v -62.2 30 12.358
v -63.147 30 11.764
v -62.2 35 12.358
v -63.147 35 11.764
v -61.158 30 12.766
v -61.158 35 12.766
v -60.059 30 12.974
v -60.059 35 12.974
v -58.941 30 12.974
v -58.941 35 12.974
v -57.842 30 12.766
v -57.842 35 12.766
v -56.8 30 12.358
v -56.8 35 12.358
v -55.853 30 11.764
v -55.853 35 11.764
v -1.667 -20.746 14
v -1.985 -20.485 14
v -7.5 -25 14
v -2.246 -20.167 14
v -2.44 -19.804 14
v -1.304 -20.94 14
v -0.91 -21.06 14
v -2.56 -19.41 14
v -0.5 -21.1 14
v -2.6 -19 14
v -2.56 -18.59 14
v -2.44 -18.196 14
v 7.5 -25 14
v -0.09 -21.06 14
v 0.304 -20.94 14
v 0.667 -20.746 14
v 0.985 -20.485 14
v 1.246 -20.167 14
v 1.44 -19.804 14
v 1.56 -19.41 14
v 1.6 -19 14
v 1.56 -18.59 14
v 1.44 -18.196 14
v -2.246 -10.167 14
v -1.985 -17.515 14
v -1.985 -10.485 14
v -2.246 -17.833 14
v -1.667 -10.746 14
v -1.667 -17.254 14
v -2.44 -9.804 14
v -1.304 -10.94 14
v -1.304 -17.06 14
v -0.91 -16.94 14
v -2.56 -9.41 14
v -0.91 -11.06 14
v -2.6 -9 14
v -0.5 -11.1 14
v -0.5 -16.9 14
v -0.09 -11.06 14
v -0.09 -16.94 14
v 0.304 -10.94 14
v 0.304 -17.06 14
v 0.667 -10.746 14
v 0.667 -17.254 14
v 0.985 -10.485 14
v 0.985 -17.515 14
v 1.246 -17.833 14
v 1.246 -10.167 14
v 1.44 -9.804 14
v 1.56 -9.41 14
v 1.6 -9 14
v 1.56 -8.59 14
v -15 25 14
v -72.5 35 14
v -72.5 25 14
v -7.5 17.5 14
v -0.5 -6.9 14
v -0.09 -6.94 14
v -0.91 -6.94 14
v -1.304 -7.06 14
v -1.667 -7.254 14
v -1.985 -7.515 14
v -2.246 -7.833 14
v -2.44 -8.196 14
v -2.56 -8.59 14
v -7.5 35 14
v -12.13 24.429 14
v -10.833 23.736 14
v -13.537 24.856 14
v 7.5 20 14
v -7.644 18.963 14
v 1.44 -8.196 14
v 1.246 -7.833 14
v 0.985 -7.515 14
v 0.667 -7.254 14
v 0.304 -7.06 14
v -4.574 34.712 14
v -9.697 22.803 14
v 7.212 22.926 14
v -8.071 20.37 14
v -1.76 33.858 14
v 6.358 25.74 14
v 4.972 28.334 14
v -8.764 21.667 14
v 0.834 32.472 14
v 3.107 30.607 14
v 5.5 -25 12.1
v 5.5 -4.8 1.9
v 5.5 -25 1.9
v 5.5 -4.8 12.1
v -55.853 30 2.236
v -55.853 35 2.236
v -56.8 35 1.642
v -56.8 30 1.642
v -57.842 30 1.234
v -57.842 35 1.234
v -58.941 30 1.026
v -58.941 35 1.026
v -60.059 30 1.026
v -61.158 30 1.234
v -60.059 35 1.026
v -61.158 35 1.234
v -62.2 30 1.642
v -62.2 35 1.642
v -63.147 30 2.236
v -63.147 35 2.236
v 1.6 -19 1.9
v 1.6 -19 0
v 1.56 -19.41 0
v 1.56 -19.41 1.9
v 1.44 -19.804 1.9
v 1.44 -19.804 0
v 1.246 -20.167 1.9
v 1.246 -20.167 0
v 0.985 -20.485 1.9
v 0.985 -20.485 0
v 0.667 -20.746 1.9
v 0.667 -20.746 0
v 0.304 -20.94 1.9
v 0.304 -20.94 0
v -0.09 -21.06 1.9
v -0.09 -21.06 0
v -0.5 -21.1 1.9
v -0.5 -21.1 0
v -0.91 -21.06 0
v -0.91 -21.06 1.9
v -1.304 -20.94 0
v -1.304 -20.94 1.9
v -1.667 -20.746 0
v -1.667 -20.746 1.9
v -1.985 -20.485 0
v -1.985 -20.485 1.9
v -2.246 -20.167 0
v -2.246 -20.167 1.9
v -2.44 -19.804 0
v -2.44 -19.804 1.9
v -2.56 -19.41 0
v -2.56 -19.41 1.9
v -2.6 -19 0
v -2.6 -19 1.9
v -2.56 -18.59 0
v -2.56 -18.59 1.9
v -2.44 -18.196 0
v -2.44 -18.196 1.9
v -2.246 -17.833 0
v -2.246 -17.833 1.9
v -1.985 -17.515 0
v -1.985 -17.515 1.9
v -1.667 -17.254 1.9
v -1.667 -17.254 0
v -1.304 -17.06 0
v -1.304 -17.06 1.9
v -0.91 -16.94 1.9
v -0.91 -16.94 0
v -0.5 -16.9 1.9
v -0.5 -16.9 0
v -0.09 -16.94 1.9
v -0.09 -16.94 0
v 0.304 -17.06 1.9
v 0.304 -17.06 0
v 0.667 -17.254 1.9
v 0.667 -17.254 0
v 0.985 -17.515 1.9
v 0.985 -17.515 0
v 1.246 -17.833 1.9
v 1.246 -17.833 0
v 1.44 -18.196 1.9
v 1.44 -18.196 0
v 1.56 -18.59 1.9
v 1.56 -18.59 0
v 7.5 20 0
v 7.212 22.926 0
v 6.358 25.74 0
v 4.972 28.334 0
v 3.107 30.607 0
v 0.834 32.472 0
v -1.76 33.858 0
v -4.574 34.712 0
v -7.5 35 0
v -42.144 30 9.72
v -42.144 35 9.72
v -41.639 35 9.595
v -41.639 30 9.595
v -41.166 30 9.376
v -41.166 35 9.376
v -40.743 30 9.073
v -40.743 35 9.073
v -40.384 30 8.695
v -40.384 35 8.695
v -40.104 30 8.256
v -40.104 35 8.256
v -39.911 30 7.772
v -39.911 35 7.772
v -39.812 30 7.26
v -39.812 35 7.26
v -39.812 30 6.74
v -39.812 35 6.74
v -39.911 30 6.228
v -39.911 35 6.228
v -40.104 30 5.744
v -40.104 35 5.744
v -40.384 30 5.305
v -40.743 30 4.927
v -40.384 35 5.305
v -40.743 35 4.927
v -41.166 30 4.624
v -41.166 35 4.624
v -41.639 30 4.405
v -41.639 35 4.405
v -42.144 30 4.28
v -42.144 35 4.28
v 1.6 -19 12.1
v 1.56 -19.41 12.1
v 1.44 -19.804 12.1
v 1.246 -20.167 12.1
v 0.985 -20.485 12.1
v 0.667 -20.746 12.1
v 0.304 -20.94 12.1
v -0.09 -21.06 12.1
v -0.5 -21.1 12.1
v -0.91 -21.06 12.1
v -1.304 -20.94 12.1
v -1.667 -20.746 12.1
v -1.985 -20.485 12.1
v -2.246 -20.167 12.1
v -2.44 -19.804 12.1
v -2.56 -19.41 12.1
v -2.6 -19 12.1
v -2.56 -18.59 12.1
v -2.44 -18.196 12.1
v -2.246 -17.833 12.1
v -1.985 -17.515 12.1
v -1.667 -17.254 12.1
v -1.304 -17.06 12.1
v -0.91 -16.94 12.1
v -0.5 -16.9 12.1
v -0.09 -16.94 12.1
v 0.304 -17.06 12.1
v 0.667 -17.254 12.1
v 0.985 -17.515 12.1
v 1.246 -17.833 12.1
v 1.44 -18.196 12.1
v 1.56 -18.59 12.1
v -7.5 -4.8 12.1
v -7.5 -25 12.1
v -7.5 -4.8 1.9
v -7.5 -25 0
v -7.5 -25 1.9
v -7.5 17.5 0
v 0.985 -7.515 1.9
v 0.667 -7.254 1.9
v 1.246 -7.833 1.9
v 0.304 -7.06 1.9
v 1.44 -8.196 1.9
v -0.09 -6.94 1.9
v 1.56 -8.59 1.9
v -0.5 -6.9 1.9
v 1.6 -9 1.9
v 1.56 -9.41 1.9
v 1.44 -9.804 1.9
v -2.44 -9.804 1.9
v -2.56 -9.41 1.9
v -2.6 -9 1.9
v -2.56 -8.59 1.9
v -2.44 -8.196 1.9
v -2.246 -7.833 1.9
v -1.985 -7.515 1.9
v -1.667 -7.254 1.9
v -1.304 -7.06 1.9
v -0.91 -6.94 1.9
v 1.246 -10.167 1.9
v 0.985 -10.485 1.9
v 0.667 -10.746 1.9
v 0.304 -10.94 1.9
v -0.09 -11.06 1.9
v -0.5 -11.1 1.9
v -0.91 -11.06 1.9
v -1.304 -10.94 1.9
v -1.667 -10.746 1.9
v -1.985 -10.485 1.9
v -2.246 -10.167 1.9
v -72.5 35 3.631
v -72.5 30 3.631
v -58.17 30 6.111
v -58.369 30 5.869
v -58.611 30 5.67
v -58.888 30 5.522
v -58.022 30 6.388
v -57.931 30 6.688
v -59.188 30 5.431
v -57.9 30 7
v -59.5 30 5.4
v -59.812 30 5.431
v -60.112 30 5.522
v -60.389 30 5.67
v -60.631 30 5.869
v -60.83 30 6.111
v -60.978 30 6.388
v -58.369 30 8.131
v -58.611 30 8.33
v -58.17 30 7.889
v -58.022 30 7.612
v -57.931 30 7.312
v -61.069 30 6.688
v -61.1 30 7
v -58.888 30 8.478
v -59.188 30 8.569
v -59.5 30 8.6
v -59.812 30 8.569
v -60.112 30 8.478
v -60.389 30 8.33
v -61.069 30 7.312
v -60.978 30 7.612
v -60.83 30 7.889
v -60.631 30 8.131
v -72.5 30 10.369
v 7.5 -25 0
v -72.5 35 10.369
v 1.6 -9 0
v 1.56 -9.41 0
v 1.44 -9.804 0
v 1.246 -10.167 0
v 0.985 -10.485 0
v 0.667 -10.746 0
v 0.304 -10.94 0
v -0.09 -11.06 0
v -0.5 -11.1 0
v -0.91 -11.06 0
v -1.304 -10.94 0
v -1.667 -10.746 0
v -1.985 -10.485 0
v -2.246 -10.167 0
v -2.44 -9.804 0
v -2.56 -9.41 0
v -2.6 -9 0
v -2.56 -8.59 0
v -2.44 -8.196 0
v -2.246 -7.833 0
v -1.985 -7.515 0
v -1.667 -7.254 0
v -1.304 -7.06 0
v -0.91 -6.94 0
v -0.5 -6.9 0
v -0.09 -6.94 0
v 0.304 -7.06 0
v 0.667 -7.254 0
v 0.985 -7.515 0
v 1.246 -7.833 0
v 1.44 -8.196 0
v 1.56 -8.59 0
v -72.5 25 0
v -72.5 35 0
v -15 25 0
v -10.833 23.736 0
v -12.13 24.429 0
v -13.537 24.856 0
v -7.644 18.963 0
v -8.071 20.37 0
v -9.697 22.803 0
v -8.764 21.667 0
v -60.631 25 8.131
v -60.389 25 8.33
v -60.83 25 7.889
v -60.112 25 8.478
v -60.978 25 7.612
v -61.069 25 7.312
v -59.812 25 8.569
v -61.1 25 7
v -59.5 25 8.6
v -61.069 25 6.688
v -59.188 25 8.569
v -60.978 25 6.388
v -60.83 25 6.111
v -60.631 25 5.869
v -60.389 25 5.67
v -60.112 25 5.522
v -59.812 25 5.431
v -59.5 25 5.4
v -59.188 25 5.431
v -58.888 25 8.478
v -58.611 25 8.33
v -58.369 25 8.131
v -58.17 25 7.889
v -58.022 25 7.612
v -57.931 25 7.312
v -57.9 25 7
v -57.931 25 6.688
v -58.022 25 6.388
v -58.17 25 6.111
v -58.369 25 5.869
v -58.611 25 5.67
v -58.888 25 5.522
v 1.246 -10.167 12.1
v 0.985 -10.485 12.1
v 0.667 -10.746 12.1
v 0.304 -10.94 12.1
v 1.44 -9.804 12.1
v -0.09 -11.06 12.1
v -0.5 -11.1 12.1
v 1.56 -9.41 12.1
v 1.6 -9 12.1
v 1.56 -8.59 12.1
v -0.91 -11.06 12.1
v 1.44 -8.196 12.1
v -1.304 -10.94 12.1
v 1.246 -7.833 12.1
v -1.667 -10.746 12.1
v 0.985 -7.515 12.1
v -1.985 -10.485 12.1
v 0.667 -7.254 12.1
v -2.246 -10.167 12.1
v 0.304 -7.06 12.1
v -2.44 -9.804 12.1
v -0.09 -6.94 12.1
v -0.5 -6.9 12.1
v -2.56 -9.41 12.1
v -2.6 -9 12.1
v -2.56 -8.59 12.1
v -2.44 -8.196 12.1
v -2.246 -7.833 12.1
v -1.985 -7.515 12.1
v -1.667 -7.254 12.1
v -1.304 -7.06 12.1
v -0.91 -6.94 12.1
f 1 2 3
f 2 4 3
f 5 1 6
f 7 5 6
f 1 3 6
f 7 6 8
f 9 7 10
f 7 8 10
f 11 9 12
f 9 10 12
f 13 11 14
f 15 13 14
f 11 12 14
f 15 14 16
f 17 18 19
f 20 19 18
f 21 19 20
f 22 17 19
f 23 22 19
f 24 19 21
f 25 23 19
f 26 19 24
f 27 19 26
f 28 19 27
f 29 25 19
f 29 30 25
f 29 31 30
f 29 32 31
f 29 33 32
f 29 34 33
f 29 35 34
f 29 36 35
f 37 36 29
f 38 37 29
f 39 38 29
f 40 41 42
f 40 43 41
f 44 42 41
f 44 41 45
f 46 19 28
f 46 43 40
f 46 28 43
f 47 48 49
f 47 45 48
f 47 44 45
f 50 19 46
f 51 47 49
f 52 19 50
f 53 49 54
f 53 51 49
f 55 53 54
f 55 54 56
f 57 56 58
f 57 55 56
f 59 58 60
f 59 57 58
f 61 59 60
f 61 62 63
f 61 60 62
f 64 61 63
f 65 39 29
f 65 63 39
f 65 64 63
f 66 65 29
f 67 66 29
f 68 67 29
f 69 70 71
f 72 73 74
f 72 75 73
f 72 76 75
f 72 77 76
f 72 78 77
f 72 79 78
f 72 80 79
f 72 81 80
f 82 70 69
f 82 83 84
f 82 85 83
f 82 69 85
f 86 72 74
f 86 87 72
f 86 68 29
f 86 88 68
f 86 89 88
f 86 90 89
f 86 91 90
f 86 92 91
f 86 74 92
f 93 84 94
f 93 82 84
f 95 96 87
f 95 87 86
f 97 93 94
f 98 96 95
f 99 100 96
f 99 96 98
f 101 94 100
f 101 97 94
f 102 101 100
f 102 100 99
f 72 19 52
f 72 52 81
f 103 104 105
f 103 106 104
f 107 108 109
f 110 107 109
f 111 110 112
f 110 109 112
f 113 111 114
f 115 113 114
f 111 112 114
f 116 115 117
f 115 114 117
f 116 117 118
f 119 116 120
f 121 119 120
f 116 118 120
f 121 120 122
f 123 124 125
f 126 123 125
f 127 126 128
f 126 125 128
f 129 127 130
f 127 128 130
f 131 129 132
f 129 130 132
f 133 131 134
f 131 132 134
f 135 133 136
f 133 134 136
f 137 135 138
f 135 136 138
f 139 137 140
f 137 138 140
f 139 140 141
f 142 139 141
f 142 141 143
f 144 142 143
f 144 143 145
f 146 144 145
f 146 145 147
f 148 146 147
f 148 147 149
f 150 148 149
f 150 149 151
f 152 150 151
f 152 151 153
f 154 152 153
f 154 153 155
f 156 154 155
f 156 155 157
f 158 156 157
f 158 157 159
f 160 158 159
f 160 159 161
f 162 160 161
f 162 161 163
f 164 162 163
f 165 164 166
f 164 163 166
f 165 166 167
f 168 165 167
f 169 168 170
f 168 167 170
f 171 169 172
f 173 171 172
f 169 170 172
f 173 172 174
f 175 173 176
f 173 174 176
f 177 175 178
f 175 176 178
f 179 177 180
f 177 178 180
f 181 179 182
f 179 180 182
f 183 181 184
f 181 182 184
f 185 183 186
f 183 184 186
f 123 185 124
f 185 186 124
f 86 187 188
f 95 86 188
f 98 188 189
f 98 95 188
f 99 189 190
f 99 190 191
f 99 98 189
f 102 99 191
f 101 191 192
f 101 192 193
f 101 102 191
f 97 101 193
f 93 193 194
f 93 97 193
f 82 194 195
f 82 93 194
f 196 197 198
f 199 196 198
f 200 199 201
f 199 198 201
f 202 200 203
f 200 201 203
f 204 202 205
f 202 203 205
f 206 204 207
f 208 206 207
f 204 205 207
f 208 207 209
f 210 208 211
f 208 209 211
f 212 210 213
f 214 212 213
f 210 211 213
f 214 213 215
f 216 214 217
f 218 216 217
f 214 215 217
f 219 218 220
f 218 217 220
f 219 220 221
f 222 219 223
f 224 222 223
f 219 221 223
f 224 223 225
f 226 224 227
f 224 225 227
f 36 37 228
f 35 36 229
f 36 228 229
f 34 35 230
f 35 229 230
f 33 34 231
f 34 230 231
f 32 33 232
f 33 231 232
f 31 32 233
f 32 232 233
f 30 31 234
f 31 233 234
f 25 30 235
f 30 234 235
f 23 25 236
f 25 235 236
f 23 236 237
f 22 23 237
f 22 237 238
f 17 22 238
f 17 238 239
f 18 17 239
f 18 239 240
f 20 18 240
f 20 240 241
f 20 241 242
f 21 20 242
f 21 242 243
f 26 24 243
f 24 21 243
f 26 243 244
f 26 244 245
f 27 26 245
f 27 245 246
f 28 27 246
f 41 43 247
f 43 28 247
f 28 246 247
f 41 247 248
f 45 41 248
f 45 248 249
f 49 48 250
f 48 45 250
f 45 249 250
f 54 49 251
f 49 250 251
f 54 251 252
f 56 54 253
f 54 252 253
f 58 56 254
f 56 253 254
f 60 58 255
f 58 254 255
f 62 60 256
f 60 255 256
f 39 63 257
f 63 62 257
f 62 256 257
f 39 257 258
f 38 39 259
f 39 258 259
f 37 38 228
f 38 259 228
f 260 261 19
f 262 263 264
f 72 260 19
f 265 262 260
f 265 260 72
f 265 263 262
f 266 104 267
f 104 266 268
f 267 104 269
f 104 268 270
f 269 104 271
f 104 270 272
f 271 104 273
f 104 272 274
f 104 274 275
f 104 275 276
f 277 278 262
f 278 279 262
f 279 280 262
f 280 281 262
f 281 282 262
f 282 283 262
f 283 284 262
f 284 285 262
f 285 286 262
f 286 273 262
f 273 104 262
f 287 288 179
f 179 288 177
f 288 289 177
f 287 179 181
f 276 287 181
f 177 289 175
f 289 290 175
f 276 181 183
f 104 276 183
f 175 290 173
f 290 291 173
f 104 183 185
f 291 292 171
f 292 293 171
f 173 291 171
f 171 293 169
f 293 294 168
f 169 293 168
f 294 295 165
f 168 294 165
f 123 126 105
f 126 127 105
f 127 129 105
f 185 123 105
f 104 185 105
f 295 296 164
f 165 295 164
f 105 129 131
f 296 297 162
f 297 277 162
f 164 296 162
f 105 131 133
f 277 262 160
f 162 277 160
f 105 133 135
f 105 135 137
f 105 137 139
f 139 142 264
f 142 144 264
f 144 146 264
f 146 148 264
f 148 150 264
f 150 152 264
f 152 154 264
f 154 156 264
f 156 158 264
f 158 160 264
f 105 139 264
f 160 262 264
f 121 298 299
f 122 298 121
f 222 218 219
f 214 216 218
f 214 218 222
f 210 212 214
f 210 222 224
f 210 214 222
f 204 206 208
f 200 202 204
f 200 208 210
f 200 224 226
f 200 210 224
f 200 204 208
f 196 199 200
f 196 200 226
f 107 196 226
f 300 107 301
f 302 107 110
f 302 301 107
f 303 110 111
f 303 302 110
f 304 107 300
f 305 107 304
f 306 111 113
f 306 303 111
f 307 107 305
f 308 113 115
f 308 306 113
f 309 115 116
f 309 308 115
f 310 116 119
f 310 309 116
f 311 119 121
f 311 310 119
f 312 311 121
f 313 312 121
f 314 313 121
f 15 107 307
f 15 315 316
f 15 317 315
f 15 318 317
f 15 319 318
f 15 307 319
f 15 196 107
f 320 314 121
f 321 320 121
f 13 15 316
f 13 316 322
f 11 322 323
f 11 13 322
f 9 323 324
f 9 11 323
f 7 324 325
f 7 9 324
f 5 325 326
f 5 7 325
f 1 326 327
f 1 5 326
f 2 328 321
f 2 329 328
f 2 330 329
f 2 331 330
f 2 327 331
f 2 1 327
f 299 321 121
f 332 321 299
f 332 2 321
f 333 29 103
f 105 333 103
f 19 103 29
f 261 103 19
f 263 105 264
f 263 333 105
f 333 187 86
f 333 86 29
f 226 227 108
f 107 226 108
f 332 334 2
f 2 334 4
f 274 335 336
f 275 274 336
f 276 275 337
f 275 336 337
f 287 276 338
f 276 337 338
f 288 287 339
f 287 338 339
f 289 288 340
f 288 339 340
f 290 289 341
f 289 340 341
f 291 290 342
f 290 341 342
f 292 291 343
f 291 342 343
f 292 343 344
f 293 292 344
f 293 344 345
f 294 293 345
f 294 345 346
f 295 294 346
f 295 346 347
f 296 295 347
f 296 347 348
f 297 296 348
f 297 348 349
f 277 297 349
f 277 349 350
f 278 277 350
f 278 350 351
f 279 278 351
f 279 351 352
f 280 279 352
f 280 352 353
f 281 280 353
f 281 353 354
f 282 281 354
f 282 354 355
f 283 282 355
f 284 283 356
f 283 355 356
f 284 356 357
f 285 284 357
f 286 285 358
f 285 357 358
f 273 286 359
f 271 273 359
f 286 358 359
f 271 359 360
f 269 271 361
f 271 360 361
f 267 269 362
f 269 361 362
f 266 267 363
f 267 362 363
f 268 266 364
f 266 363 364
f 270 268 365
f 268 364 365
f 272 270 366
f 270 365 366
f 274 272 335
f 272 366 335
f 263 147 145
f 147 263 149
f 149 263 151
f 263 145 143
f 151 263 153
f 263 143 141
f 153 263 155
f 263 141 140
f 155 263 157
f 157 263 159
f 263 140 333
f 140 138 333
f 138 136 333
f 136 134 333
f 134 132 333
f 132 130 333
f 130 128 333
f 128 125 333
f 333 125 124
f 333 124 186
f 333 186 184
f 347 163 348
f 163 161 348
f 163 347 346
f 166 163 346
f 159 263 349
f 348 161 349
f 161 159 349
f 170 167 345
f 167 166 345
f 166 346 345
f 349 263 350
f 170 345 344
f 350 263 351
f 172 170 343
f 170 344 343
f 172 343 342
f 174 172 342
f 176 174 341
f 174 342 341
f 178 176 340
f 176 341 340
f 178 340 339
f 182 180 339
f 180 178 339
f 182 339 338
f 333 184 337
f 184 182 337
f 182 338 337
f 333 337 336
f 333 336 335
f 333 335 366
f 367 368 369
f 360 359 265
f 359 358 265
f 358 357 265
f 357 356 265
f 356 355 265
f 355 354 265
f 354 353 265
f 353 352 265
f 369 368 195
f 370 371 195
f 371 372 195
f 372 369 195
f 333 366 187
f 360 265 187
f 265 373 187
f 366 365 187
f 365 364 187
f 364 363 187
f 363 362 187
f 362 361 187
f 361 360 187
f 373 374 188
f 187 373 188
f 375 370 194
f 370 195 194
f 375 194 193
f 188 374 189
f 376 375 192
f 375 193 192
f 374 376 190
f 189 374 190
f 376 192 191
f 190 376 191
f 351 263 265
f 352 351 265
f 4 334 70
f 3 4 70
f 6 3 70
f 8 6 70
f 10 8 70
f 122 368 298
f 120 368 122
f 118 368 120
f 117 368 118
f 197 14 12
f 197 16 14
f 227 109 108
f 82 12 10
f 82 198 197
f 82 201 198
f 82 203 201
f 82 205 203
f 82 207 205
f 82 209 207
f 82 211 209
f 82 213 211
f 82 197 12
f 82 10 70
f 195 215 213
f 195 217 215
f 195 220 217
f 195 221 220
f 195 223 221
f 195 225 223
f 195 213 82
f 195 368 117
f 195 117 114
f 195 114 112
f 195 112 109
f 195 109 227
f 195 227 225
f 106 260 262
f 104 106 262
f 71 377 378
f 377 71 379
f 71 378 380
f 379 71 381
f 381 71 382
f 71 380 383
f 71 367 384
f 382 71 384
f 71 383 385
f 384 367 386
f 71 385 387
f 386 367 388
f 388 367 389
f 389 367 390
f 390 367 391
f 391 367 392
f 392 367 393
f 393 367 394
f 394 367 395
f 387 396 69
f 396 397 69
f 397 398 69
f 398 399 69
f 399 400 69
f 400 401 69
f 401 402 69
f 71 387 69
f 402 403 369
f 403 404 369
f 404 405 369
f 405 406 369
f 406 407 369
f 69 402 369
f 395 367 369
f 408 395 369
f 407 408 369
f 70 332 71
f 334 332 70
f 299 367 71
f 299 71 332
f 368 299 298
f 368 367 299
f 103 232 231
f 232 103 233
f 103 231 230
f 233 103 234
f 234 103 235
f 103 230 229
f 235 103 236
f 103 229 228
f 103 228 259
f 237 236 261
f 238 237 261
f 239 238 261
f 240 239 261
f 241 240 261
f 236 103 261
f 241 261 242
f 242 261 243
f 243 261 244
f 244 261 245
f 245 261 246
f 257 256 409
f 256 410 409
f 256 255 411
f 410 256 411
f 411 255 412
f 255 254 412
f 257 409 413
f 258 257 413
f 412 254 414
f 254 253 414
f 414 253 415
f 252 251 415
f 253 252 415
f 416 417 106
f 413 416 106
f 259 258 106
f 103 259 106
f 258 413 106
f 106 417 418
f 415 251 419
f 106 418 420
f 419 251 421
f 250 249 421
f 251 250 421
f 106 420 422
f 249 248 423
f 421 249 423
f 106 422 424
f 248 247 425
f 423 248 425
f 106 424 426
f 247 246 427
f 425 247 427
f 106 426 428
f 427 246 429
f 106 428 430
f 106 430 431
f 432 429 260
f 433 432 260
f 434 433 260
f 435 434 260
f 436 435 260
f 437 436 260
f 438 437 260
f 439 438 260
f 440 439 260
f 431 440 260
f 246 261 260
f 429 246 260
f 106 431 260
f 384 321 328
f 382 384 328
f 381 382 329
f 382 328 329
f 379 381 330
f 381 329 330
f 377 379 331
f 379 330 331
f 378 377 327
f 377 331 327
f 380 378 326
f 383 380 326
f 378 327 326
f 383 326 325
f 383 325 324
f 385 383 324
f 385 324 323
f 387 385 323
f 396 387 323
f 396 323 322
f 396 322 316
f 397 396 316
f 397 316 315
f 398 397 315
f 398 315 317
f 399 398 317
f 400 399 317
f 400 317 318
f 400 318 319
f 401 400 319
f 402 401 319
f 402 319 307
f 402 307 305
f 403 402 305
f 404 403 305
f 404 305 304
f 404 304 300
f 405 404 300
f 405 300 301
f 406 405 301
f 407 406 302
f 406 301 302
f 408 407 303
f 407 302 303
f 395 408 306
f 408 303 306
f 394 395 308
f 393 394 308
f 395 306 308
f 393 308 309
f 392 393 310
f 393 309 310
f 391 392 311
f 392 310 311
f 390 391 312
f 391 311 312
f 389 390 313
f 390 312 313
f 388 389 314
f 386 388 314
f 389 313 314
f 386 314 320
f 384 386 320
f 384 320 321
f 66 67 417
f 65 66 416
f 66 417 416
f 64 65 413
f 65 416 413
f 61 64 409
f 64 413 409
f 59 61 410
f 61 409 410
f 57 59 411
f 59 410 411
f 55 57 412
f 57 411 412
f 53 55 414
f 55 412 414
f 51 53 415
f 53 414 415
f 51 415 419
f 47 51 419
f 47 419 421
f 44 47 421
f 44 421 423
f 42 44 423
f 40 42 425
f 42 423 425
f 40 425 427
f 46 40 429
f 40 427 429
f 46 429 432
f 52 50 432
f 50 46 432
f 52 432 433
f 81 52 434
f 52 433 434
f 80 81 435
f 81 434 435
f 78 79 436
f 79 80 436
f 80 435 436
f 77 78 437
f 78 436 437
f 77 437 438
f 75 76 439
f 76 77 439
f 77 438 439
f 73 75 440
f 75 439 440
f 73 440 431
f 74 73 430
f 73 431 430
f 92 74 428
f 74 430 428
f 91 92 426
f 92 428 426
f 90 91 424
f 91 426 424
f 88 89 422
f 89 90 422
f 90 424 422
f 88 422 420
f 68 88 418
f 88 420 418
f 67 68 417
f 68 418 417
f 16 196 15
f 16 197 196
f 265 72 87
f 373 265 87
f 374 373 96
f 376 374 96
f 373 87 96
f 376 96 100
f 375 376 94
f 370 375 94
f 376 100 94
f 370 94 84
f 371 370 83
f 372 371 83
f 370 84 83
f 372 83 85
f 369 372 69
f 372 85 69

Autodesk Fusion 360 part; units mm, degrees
sketch "Sketch1" plane through (0, 0, 0) normal (0, 0, 1) x (1, 0, 0)
  line L0 (7.5, -25) -> (-7.5, -25)
  line L1 (-7.5, -25) -> (-7.5, 25)
  line L2 (7.5, 25) -> (7.5, -25)
  line L3 (7.5, -25) -> (-7.5, 25) construction
  line L4 (-7.5, -25) -> (7.5, 25) construction
  line L5 (-72.5, 25) -> (-72.5, 35)
  line L6 (-72.5, 35) -> (7.5, 35)
  line L7 (7.5, 35) -> (7.5, 25)
  line L8 (-72.5, 25) -> (-7.5, 25)
  circle A0 centre (-0.5, -19) radius 2.1
  circle A1 centre (-0.5, -9) radius 2.1
  dimension "d1" = 50
  dimension "d2" = 15
  dimension "d3" = 10
  dimension "d4" = 80
  dimension "d11" = 4.2
  dimension "d12" = 4.2
  dimension "d13" = 6
  dimension "d14" = 10
  dimension "d15" = 8
  dimension "d16" = 8
  dimension "d19" = 7
extrude "Extrude1" add sketch "Sketch1" along normal blind 14
sketch "Sketch2" plane through (-7.5, 0, 0) normal (-1, 0, 0) x (0, -1, 0)
  line L0 (-25, 0) -> (25, 0)
  line L1 (25, 0) -> (25, 14)
  line L2 (25, 14) -> (-25, 14)
  line L3 (-25, 14) -> (-25, 0)
  line L4 (25, 12.1) -> (4.8, 12.1)
  line L5 (4.8, 12.1) -> (4.8, 1.9)
  line L6 (4.8, 1.9) -> (25, 1.9)
  line L7 (25, 1.9) -> (25, 12.1)
  line L8 (25, 14) -> (-25, 0) construction
  line L9 (-25, 14) -> (25, 0) construction
  line L10 (0, 7) -> (45, 7) construction
  dimension "d7" = 10.2
  dimension "d8" = 20.2
extrude "Extrude2" cut sketch "Sketch2" against normal blind 13 contours L1 L4 L5 L6 L7
sketch "Sketch3" plane through (0, 35, 0) normal (0, 1, 0) x (-1, 0, 0)
  line L0 (-7.5, 0) -> (72.5, 0)
  line L1 (72.5, 0) -> (72.5, 14)
  line L2 (72.5, 14) -> (-7.5, 14)
  line L3 (-7.5, 14) -> (-7.5, 0)
fillet "Fillet1" radius 15 1 edges at (7.5, 35, 7)
fillet "Fillet1" radius 7.5 1 edges at (-7.5, 25, 7)
sketch "Sketch4" plane through (0, 35, 0) normal (0, 1, 0) x (-1, 0, 0)
  line L0 (59.5, 14) -> (59.5, 0) construction
  line L1 (7.5, 14) -> (7.5, 0)
  line L2 (7.5, 0) -> (72.5, 0)
  line L3 (72.5, 0) -> (72.5, 14)
  line L4 (72.5, 14) -> (7.5, 14)
  line L5 (72.5, 7) -> (1.5224, 7) construction
  circle A0 centre (59.5, 7) radius 6
  circle A1 centre (42.55, 7) radius 2.75
  circle A2 centre (76.45, 7) radius 2.75
  line L6 (39.8, 7) -> (39.8, 0) construction
  line L7 (79.2, 7) -> (79.2, 0) construction
  circle A3 centre (59.5, 7) radius 1.6
  circle A4 centre (59.5, 7) radius 5.25
  line L8 (42.1444, 9.7199) -> (58.7257, 12.1926)
  line L9 (42.1444, 4.2801) -> (58.7257, 1.8074)
  line L10 (76.8556, 4.2801) -> (60.2743, 1.8074)
  line L11 (76.8556, 9.7199) -> (60.2743, 12.1926)
  point P0 (-7.5, 14)
  dimension "d20" = 67
  dimension "d21" = 12
  dimension "d22" = 5.5
  dimension "d23" = 5.5
  dimension "d24" = 19.7
  dimension "d25" = 19.7
  dimension "d26" = 3.2
  dimension "d31" = 10.5
extrude "Extrude3" cut sketch "Sketch4" against normal blind 5 contours L3 A2 L10 L11 | L3 A0 L10 L11 | A2 | A0 A4 L8 L11 | A0 A4 L10 L11 | A0 A4 L9 L10 | A0 A4 L8 L9 | A0 A1 L8 L9 | A4 | A1
extrude "Extrude4" cut 1 faces at (-60.4127, 35, 7.0214) along direction (0, -1, 0) through all
ref_plane "WorkPlane1" through (-33.5, 0, 7) normal (1, 0, 0) x (0, 1, 0)
split "Split1" [suppressed]
